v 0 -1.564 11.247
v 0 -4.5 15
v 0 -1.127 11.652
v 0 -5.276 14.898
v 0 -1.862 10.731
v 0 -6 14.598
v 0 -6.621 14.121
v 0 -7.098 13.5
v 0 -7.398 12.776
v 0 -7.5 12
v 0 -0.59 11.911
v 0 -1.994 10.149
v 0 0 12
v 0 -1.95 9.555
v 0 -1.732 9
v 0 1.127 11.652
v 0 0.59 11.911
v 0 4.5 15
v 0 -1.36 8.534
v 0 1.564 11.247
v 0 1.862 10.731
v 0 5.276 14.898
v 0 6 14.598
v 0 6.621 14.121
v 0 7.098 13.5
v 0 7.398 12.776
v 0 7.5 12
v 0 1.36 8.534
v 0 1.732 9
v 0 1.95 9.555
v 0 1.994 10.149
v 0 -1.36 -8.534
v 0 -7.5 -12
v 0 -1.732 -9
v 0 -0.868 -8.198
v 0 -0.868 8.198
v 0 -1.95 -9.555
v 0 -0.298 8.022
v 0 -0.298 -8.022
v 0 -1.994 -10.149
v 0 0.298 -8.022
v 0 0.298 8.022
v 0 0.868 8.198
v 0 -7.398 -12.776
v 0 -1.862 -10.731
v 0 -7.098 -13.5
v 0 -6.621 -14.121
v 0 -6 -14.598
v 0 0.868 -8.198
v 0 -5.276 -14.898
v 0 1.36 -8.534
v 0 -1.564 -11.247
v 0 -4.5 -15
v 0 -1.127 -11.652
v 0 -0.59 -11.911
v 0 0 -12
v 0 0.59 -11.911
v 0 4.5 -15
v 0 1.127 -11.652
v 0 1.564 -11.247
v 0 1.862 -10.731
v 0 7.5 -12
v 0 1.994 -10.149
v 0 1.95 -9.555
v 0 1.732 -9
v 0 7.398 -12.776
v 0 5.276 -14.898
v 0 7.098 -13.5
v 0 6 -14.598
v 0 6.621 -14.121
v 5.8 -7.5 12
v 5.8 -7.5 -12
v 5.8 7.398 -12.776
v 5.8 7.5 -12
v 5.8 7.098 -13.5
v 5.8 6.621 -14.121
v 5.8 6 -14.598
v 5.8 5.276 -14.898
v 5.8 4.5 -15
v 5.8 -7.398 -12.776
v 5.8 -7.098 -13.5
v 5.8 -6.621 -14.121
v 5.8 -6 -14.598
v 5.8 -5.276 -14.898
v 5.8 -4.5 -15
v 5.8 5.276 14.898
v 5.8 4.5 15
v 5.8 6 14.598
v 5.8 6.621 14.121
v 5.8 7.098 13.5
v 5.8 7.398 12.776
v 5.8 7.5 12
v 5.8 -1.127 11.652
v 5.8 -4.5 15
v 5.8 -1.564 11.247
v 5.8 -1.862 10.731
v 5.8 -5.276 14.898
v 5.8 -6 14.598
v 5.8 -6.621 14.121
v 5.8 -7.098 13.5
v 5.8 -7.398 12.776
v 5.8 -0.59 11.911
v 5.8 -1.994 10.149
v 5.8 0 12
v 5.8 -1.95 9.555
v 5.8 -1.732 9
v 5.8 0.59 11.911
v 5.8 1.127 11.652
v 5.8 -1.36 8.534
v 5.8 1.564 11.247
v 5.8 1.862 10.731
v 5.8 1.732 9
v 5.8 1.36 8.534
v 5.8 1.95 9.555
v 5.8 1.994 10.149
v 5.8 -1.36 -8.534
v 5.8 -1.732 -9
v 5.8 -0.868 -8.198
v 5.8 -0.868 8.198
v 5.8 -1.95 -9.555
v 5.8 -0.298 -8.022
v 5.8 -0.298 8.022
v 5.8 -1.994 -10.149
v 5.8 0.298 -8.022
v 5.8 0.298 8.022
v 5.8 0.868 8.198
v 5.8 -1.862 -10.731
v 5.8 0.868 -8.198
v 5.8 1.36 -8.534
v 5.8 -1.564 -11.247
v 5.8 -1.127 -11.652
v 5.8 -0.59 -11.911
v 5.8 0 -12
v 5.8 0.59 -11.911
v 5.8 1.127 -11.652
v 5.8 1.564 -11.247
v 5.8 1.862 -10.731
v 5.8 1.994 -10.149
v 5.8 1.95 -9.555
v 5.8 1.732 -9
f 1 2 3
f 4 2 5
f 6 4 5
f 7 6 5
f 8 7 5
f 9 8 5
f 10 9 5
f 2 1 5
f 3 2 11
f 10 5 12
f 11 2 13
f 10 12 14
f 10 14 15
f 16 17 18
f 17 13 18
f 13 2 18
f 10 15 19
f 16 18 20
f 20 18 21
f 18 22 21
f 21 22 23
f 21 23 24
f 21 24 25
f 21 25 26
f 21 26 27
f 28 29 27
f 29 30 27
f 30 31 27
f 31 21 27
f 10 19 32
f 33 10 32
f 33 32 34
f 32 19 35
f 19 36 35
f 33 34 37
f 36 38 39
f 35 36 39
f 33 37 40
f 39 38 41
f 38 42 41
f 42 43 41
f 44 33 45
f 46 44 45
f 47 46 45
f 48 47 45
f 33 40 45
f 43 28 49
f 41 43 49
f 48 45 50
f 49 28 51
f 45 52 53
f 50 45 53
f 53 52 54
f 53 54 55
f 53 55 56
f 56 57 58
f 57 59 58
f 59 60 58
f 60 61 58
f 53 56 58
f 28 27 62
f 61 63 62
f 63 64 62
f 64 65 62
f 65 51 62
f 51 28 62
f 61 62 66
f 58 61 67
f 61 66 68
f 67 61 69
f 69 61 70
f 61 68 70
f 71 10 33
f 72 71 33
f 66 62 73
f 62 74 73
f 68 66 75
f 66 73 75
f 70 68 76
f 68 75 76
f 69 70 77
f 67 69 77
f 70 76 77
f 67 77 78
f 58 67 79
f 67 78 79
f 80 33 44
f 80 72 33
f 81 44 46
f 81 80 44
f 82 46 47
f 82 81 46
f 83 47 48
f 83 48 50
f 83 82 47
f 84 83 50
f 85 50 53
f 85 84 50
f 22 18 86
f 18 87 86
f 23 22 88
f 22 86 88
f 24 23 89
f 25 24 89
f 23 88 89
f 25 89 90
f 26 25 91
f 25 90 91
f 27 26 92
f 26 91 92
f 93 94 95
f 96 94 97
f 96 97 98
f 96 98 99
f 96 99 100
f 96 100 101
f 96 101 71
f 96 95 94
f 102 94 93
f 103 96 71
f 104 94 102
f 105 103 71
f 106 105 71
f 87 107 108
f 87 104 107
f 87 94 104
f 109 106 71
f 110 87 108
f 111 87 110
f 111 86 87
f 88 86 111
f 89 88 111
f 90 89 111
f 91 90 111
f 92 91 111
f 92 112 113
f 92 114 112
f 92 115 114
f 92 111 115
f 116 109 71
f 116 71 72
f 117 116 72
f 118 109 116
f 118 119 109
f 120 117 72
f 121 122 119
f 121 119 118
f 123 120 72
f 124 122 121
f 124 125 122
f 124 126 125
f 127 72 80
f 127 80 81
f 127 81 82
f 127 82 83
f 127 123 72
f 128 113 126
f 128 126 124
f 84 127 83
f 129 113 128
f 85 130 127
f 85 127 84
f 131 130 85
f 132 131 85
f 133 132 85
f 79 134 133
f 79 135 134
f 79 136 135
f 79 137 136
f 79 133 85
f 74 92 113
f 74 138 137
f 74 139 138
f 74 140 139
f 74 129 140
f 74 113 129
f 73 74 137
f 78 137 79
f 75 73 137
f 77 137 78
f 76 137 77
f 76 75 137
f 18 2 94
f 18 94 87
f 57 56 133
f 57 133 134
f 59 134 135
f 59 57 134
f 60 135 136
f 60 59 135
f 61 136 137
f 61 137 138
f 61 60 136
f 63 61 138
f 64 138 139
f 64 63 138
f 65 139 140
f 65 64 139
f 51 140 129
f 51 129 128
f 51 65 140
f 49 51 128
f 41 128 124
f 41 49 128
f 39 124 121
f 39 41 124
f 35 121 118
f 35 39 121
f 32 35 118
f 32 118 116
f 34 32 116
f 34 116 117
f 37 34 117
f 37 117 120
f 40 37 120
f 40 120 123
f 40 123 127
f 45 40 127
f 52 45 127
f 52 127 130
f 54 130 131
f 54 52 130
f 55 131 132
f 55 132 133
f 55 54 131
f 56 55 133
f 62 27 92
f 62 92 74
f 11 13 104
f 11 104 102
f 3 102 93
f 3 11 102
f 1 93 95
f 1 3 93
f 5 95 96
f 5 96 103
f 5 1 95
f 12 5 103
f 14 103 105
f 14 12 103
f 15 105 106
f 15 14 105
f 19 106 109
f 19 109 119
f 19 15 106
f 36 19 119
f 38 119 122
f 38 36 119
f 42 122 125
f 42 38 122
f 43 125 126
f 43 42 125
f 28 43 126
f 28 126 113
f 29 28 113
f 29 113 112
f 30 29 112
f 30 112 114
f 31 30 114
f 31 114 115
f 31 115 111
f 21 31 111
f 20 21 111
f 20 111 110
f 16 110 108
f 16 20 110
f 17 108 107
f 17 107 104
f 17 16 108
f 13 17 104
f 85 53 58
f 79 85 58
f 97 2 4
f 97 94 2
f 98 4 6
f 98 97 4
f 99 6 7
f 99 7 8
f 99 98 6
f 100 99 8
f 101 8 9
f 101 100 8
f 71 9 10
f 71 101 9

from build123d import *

# Parameters (mm, degrees)
SKETCH_1_W      = 30
SKETCH_1_H      = 15
SKETCH_1_R      = 2
EXTRUDE_1_DEPTH = 5.8
FILLET_1_R      = 3


with BuildPart() as part:
    # ｽｹｯﾁ1 → ﾎﾞｽ - 押し出し1 (new body)
    with BuildSketch(Plane(origin=(0, 0, 0), x_dir=(0, 0, -1), z_dir=(1, 0, 0))):
        Rectangle(SKETCH_1_W, SKETCH_1_H)
        with Locations((10, 0)):
            Circle(SKETCH_1_R, mode=Mode.SUBTRACT)
        with Locations(Location((-10, 0, 0), (0, 0, 180))):
            Circle(SKETCH_1_R, mode=Mode.SUBTRACT)
    extrude(amount=EXTRUDE_1_DEPTH)

    # ﾌｨﾚｯﾄ1
    fillet_1_edges = [part.edges().sort_by_distance(p)[0] for p in [
        (2.9, -7.5, -15),
        (2.9, -7.5, 15),
        (2.9, 7.5, 15),
        (2.9, 7.5, -15),
    ]]
    fillet(fillet_1_edges, radius=FILLET_1_R)


solid = part.part
